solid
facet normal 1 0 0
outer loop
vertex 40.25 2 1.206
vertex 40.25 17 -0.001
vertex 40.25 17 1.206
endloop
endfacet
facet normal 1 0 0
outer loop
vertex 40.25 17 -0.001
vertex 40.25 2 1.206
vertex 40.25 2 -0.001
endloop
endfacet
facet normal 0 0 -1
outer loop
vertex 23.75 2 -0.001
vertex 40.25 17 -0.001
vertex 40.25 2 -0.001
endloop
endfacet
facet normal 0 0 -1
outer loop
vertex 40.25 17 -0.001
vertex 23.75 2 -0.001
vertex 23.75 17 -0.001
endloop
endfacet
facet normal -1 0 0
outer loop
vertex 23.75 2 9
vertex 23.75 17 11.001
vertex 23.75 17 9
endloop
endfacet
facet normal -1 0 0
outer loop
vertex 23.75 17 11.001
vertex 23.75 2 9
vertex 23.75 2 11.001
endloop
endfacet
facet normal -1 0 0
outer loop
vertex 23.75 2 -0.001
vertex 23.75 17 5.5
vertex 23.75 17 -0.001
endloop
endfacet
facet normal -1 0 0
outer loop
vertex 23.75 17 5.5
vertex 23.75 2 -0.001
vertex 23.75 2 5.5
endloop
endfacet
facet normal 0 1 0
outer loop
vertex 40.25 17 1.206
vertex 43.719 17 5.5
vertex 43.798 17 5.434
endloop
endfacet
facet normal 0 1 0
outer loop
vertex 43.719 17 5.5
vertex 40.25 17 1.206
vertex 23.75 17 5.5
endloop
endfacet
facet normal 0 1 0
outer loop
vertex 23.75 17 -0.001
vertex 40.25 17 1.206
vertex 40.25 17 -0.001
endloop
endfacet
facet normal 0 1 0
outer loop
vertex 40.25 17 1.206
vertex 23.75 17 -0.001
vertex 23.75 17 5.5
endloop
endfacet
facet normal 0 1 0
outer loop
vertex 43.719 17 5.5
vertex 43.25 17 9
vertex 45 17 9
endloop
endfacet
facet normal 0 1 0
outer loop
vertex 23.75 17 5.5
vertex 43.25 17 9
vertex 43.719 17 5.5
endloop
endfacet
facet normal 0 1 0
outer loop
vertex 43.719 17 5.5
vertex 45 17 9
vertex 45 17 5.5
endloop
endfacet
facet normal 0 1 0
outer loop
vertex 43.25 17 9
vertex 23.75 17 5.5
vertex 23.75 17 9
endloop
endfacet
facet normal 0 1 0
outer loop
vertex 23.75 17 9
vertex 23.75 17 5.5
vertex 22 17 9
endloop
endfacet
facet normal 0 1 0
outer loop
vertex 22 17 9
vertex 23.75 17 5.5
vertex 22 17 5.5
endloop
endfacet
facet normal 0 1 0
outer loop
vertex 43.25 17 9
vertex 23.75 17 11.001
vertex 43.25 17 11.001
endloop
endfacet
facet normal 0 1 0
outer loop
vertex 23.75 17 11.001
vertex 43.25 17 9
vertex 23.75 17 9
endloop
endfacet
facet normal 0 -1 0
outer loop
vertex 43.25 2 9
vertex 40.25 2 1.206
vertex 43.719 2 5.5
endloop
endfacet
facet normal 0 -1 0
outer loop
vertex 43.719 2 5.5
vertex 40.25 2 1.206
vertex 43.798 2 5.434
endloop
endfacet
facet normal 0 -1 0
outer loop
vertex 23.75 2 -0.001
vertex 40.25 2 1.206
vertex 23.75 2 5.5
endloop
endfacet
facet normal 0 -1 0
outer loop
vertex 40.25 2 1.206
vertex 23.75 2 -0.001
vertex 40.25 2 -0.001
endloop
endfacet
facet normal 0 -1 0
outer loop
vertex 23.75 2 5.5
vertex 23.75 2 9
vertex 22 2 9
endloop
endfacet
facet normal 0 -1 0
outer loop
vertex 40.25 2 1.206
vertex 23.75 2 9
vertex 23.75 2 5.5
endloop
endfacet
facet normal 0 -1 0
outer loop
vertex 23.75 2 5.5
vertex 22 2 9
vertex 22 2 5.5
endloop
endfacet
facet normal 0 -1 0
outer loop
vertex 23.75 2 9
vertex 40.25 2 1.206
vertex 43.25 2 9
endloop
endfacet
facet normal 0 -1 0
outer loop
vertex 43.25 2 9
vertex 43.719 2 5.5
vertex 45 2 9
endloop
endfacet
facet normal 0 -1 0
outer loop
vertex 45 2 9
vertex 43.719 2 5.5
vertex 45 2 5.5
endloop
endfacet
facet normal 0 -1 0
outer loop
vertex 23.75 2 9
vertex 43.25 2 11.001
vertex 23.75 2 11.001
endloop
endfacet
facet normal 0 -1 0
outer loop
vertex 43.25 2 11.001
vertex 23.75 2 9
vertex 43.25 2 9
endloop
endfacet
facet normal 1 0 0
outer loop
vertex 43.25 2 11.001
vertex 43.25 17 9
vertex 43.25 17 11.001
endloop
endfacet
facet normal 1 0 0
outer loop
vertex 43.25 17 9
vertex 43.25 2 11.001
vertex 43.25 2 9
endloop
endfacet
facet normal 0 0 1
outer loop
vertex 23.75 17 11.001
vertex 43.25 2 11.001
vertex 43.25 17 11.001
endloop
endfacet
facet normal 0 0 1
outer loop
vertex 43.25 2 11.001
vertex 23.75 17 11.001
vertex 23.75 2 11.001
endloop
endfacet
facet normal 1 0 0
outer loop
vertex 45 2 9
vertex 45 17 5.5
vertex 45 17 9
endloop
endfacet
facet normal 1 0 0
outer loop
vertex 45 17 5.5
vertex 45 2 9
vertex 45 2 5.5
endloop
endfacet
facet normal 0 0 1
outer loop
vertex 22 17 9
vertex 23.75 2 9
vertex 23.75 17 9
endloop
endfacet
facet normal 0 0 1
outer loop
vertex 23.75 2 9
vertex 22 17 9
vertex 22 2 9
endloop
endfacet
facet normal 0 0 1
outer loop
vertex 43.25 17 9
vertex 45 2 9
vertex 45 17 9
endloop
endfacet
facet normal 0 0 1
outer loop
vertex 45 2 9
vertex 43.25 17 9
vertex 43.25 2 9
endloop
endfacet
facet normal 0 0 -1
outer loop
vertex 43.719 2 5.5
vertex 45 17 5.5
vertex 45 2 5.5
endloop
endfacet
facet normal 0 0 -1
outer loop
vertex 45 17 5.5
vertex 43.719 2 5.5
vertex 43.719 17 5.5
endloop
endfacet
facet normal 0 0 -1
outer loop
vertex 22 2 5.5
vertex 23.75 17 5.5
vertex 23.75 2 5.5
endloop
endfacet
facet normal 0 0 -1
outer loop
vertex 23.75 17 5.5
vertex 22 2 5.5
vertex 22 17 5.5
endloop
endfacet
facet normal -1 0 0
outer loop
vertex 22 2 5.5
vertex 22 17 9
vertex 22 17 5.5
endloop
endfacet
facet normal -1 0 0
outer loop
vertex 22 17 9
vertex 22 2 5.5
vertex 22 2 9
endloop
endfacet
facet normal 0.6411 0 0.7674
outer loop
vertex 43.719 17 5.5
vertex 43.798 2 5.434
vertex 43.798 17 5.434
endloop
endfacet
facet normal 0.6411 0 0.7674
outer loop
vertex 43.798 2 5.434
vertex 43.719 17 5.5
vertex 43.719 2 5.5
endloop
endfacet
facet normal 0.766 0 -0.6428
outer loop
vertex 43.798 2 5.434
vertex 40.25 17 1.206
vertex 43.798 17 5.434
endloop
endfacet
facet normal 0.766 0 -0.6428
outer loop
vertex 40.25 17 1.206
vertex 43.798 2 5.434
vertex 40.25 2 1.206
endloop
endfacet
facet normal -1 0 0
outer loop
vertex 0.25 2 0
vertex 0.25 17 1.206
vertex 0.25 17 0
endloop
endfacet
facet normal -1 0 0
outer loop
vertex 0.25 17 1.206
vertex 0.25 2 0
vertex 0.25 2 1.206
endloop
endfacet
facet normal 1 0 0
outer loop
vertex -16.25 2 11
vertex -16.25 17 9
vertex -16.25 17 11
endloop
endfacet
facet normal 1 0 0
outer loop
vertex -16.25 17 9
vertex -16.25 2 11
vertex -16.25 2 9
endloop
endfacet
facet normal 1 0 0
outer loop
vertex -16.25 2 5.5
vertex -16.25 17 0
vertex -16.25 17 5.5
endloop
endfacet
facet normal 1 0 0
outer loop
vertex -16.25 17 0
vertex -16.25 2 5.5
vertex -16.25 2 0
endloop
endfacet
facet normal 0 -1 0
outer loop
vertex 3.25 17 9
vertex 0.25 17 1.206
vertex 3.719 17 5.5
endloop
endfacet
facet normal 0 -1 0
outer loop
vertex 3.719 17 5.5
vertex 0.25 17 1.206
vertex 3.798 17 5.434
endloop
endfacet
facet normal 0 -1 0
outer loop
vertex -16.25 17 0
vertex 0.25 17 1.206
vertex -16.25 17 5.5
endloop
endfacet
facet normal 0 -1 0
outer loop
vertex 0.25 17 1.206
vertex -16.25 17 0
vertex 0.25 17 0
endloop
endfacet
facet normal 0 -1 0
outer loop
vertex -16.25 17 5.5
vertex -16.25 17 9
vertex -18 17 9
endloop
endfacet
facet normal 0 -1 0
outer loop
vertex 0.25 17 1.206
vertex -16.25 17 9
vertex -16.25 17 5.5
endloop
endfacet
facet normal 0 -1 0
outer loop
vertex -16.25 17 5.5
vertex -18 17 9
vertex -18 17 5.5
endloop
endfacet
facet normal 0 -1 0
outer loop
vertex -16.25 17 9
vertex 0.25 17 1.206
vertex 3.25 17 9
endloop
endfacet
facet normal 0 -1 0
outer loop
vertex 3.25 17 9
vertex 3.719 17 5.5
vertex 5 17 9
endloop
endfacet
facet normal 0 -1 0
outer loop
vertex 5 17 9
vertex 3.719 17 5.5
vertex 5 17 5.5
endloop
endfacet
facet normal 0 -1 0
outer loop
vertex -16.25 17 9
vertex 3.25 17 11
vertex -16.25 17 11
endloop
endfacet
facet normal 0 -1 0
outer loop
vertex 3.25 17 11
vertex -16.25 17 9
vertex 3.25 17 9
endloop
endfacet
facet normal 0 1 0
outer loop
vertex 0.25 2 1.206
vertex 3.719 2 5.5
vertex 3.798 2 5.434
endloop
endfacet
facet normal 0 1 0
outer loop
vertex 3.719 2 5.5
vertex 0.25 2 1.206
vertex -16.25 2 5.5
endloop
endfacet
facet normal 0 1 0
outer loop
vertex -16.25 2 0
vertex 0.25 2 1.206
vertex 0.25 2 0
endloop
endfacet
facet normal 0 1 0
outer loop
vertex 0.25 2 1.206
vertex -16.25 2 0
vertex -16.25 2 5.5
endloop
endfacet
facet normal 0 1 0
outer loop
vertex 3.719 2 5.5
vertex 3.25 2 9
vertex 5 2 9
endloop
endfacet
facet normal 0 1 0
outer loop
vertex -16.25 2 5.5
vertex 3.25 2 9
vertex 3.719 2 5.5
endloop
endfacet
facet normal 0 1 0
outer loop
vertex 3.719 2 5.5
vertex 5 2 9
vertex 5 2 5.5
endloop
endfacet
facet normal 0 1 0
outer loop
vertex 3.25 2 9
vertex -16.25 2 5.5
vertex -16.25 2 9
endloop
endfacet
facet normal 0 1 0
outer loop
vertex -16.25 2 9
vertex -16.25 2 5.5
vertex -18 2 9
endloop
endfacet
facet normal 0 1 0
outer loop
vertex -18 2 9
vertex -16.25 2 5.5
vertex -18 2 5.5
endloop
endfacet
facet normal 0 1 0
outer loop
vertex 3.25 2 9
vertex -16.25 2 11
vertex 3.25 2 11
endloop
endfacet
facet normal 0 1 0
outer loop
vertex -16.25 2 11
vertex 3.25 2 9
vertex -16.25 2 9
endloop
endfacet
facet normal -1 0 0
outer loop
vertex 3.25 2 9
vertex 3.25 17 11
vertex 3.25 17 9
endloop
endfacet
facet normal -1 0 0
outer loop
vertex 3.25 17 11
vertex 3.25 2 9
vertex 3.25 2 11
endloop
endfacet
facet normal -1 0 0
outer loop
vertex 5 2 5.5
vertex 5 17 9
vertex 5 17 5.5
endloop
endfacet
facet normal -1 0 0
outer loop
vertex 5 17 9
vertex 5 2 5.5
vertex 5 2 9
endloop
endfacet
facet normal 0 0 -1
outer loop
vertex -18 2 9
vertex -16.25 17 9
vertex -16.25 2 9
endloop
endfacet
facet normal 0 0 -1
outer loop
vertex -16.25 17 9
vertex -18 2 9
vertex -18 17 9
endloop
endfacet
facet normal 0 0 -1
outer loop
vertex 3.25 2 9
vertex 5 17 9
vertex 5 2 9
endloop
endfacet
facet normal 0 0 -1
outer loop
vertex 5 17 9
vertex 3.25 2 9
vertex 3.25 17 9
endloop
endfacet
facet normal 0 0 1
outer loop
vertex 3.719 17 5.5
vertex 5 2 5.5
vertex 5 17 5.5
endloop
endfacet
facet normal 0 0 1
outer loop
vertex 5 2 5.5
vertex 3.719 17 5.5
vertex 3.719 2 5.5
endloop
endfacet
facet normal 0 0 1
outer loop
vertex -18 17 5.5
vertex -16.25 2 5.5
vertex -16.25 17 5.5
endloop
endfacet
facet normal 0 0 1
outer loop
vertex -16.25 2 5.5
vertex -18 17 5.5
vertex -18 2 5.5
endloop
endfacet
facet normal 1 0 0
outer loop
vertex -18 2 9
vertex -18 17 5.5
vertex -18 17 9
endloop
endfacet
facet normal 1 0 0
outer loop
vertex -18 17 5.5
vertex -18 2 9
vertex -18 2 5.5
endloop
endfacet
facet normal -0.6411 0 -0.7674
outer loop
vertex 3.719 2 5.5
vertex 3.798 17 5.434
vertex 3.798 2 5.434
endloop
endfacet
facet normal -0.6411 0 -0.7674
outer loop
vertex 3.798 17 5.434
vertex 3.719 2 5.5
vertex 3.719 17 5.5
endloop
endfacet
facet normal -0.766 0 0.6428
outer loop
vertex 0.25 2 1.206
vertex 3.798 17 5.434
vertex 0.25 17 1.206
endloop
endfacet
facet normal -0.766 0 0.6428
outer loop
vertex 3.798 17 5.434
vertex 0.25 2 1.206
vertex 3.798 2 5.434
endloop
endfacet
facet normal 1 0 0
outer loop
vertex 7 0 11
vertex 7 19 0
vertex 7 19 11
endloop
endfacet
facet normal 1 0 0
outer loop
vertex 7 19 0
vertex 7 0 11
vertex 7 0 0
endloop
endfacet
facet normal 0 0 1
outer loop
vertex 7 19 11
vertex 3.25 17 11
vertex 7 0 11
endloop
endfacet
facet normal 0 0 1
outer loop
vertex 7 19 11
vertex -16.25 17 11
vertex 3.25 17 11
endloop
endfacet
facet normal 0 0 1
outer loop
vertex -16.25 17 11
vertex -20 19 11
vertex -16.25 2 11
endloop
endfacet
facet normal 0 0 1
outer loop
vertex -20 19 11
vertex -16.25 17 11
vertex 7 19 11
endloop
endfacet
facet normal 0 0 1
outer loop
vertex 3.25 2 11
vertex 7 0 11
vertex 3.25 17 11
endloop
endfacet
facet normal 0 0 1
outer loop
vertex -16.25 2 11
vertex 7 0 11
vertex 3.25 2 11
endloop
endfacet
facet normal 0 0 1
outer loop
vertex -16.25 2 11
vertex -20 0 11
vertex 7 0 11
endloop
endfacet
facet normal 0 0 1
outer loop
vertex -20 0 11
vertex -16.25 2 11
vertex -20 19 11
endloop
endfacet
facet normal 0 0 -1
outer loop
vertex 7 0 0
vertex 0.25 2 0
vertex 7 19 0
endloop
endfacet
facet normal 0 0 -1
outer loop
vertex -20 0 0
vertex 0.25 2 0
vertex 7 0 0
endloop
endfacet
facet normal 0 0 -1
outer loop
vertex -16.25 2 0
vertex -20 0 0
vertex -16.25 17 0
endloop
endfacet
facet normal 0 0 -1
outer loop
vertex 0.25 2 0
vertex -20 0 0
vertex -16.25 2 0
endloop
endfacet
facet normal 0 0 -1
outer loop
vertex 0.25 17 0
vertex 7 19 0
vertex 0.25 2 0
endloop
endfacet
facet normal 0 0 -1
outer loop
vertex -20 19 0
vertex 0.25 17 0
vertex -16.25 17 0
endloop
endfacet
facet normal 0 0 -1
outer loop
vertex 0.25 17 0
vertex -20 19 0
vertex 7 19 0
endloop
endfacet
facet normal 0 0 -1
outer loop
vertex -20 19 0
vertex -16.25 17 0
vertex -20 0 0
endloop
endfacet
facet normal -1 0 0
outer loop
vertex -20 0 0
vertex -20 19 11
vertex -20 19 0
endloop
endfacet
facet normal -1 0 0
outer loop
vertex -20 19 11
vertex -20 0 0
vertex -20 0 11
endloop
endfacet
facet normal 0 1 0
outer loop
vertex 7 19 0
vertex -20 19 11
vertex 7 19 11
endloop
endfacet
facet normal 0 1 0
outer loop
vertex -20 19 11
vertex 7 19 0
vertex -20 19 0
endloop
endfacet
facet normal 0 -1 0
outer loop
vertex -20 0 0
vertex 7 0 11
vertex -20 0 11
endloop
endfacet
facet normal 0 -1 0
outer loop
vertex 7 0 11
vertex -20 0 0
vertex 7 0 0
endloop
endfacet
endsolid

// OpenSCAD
/*
  Keystone Module library 1.0 (2019-11-25) for OpenSCAD
  Author: @grauerfuchs
  Licensed under CC BY-SA https://creativecommons.org/use-remix/cc-licenses/#by-sa  
*/

// Test solids
translate([20, 0, 0]) keystone_Module(false);
translate([-20, 0, 0]) keystone_Receptacle();

module keystone_Receptacle(center=false) {
   translate([
        center ? (-0.5 * 26.5) : 0,
        center ? (-0.5 * 19) : 0,
        center ? (-0.5 * 10) : 0
    ])   
        difference(){
            cube([27, 19, 11]);
            keystone_Module(center=false);
        }
}
module keystone_Module(center=false){
    translate([center ? (23 * -0.5) : 2, center ? (15.0 * -0.5) : 2, center ? (11 * -0.5) : 0]){
                // Jack face
                translate([1.75, 0, -0.001])
                    cube([16.5, 15, 10.001]); // A little over to ensure the pre-render is clean
                // Jack back
                translate([1.75, 0, 8])
                    cube([19.5, 15, 3.001]); // A little over to ensure the pre-render is clean
                // Clip catches
                translate([0, 0, 5.5])
                    cube([23, 15, 3.5]);
                // Fix the edge of the clip catch so you can insert a block
                translate([15, 0, 2])
                    rotate([0, 40, 0])
                        cube([3, 15, 7]);
            } 
}
